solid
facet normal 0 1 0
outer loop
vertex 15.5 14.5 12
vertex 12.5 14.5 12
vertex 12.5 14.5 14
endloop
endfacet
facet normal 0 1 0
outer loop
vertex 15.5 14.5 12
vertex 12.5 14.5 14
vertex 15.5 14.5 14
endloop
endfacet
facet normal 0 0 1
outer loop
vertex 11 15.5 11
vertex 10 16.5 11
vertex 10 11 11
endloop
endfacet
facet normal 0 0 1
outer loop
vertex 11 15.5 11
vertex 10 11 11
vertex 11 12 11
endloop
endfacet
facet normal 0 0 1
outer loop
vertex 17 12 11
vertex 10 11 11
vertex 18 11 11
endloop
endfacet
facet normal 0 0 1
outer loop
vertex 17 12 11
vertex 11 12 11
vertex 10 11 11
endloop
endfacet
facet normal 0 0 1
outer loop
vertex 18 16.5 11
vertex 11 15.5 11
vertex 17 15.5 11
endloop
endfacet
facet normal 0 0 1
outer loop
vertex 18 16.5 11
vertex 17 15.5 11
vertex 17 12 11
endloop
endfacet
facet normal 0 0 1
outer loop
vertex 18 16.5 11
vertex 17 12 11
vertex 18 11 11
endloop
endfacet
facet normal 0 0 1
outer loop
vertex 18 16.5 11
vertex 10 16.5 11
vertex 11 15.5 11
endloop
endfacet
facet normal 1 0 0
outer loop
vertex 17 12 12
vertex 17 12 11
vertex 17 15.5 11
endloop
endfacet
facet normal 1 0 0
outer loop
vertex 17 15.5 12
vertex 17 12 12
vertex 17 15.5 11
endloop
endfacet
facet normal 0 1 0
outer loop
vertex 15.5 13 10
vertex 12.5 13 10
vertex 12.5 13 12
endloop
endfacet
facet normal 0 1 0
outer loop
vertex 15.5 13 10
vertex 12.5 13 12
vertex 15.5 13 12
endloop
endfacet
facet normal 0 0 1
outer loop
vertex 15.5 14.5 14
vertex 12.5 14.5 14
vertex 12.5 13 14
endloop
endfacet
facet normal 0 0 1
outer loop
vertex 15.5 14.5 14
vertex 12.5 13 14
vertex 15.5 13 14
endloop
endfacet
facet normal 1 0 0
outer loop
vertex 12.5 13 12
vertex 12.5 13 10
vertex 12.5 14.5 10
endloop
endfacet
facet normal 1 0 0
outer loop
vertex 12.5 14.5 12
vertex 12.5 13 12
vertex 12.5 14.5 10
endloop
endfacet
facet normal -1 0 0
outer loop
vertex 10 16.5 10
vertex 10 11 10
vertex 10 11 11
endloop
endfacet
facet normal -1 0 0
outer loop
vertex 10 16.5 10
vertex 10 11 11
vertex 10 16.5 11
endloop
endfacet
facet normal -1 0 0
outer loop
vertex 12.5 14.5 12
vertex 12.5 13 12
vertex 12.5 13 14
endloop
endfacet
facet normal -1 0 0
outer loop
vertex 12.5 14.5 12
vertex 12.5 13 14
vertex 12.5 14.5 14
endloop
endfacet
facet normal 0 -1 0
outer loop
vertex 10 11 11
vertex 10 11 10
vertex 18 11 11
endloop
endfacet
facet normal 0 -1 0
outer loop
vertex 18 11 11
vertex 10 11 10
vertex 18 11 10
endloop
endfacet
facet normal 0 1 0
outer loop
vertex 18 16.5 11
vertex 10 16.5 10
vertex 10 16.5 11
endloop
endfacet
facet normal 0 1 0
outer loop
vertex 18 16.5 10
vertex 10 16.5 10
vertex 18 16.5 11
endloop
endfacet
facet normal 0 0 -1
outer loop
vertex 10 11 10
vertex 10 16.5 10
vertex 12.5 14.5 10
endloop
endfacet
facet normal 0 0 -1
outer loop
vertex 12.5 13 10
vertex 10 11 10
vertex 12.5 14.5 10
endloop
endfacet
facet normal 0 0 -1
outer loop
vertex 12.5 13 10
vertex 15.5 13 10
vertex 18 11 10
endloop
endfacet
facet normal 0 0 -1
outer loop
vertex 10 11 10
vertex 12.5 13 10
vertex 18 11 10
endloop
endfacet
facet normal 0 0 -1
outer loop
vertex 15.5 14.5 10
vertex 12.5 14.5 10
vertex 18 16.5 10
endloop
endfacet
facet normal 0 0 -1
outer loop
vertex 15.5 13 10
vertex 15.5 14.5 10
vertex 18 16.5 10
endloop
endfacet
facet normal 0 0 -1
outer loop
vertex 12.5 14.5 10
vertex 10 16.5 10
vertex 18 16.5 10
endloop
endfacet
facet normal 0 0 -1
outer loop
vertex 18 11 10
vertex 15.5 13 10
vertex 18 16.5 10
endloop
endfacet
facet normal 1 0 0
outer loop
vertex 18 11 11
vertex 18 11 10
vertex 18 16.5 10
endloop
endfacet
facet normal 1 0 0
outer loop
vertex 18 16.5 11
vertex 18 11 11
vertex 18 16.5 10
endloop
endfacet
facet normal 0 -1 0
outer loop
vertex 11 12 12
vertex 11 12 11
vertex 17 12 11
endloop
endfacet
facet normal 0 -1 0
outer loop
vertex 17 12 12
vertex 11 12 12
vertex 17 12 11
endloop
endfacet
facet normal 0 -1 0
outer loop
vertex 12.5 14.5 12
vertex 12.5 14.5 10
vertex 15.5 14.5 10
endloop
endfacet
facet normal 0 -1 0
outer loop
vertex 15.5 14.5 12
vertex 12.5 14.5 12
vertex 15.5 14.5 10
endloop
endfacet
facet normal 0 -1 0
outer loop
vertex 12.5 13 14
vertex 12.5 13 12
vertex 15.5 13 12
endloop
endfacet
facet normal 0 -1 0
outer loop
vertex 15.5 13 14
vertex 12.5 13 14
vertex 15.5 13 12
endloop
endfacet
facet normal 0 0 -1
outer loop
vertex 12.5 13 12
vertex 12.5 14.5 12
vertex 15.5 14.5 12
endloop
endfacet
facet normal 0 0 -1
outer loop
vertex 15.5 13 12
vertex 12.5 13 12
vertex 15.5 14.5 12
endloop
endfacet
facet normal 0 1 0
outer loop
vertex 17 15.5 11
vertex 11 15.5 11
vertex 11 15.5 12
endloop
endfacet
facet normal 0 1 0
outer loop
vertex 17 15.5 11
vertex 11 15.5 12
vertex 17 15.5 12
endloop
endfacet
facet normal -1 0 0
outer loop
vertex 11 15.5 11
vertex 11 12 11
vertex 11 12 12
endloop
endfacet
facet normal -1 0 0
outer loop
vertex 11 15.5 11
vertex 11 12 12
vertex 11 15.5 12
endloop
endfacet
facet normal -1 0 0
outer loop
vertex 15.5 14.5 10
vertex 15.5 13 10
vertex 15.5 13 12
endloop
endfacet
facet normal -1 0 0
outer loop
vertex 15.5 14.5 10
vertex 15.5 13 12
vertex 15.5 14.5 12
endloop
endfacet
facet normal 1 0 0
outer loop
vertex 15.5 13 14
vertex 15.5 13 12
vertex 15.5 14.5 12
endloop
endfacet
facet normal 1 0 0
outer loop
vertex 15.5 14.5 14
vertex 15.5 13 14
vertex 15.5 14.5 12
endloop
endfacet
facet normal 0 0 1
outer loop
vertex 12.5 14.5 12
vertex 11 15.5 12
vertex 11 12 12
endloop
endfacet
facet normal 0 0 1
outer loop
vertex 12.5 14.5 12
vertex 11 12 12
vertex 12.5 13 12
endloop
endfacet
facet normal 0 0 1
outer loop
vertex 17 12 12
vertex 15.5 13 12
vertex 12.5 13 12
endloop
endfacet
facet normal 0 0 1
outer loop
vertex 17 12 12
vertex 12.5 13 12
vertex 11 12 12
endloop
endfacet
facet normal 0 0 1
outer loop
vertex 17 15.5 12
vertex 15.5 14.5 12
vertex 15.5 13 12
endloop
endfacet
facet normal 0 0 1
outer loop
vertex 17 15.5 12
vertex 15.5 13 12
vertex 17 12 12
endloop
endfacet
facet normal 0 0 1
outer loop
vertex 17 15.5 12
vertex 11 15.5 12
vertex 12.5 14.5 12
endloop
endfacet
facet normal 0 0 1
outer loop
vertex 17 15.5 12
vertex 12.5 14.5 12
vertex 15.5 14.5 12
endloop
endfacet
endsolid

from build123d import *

# Parameters (mm, degrees)
BOX008_W     = 3
BOX008_H     = 1.5
BOX008_DEPTH = 2
BOX006_W     = 8
BOX006_H     = 5.5
BOX006_DEPTH = 1
BOX007_W     = 3
BOX007_H     = 1.5
BOX007_DEPTH = 2
BOX005_W     = 6
BOX005_H     = 3.5
BOX005_DEPTH = 2


with BuildPart() as cube006:
    # Box008 → Box008 (new body)
    with BuildSketch(Plane(origin=(12.5, 13, 10), x_dir=(1, 0, 0), z_dir=(0, 0, 1))):
        with Locations((1.5, 0.75)):
            Rectangle(BOX008_W, BOX008_H)
    extrude(amount=BOX008_DEPTH)


with BuildPart() as cube004:
    # Box006 → Box006 (new body)
    with BuildSketch(Plane(origin=(10, 11, 10), x_dir=(1, 0, 0), z_dir=(0, 0, 1))):
        with Locations((4, 2.75)):
            Rectangle(BOX006_W, BOX006_H)
    extrude(amount=BOX006_DEPTH)


with BuildPart() as cube005:
    # Box007 → Box007 (new body)
    with BuildSketch(Plane(origin=(12.5, 13, 12), x_dir=(1, 0, 0), z_dir=(0, 0, 1))):
        with Locations((1.5, 0.75)):
            Rectangle(BOX007_W, BOX007_H)
    extrude(amount=BOX007_DEPTH)


with BuildPart() as membrane_sw001:
    # Box005 → Box005 (new body)
    with BuildSketch(Plane(origin=(11, 12, 10), x_dir=(1, 0, 0), z_dir=(0, 0, 1))):
        with Locations((3, 1.75)):
            Rectangle(BOX005_W, BOX005_H)
    extrude(amount=BOX005_DEPTH)

    # Fusion001: union Cube004, Cube005
    add(cube004.part)
    add(cube005.part)

    # Cut001: cut Cube006
    add(cube006.part, mode=Mode.SUBTRACT)


solid = membrane_sw001.part
